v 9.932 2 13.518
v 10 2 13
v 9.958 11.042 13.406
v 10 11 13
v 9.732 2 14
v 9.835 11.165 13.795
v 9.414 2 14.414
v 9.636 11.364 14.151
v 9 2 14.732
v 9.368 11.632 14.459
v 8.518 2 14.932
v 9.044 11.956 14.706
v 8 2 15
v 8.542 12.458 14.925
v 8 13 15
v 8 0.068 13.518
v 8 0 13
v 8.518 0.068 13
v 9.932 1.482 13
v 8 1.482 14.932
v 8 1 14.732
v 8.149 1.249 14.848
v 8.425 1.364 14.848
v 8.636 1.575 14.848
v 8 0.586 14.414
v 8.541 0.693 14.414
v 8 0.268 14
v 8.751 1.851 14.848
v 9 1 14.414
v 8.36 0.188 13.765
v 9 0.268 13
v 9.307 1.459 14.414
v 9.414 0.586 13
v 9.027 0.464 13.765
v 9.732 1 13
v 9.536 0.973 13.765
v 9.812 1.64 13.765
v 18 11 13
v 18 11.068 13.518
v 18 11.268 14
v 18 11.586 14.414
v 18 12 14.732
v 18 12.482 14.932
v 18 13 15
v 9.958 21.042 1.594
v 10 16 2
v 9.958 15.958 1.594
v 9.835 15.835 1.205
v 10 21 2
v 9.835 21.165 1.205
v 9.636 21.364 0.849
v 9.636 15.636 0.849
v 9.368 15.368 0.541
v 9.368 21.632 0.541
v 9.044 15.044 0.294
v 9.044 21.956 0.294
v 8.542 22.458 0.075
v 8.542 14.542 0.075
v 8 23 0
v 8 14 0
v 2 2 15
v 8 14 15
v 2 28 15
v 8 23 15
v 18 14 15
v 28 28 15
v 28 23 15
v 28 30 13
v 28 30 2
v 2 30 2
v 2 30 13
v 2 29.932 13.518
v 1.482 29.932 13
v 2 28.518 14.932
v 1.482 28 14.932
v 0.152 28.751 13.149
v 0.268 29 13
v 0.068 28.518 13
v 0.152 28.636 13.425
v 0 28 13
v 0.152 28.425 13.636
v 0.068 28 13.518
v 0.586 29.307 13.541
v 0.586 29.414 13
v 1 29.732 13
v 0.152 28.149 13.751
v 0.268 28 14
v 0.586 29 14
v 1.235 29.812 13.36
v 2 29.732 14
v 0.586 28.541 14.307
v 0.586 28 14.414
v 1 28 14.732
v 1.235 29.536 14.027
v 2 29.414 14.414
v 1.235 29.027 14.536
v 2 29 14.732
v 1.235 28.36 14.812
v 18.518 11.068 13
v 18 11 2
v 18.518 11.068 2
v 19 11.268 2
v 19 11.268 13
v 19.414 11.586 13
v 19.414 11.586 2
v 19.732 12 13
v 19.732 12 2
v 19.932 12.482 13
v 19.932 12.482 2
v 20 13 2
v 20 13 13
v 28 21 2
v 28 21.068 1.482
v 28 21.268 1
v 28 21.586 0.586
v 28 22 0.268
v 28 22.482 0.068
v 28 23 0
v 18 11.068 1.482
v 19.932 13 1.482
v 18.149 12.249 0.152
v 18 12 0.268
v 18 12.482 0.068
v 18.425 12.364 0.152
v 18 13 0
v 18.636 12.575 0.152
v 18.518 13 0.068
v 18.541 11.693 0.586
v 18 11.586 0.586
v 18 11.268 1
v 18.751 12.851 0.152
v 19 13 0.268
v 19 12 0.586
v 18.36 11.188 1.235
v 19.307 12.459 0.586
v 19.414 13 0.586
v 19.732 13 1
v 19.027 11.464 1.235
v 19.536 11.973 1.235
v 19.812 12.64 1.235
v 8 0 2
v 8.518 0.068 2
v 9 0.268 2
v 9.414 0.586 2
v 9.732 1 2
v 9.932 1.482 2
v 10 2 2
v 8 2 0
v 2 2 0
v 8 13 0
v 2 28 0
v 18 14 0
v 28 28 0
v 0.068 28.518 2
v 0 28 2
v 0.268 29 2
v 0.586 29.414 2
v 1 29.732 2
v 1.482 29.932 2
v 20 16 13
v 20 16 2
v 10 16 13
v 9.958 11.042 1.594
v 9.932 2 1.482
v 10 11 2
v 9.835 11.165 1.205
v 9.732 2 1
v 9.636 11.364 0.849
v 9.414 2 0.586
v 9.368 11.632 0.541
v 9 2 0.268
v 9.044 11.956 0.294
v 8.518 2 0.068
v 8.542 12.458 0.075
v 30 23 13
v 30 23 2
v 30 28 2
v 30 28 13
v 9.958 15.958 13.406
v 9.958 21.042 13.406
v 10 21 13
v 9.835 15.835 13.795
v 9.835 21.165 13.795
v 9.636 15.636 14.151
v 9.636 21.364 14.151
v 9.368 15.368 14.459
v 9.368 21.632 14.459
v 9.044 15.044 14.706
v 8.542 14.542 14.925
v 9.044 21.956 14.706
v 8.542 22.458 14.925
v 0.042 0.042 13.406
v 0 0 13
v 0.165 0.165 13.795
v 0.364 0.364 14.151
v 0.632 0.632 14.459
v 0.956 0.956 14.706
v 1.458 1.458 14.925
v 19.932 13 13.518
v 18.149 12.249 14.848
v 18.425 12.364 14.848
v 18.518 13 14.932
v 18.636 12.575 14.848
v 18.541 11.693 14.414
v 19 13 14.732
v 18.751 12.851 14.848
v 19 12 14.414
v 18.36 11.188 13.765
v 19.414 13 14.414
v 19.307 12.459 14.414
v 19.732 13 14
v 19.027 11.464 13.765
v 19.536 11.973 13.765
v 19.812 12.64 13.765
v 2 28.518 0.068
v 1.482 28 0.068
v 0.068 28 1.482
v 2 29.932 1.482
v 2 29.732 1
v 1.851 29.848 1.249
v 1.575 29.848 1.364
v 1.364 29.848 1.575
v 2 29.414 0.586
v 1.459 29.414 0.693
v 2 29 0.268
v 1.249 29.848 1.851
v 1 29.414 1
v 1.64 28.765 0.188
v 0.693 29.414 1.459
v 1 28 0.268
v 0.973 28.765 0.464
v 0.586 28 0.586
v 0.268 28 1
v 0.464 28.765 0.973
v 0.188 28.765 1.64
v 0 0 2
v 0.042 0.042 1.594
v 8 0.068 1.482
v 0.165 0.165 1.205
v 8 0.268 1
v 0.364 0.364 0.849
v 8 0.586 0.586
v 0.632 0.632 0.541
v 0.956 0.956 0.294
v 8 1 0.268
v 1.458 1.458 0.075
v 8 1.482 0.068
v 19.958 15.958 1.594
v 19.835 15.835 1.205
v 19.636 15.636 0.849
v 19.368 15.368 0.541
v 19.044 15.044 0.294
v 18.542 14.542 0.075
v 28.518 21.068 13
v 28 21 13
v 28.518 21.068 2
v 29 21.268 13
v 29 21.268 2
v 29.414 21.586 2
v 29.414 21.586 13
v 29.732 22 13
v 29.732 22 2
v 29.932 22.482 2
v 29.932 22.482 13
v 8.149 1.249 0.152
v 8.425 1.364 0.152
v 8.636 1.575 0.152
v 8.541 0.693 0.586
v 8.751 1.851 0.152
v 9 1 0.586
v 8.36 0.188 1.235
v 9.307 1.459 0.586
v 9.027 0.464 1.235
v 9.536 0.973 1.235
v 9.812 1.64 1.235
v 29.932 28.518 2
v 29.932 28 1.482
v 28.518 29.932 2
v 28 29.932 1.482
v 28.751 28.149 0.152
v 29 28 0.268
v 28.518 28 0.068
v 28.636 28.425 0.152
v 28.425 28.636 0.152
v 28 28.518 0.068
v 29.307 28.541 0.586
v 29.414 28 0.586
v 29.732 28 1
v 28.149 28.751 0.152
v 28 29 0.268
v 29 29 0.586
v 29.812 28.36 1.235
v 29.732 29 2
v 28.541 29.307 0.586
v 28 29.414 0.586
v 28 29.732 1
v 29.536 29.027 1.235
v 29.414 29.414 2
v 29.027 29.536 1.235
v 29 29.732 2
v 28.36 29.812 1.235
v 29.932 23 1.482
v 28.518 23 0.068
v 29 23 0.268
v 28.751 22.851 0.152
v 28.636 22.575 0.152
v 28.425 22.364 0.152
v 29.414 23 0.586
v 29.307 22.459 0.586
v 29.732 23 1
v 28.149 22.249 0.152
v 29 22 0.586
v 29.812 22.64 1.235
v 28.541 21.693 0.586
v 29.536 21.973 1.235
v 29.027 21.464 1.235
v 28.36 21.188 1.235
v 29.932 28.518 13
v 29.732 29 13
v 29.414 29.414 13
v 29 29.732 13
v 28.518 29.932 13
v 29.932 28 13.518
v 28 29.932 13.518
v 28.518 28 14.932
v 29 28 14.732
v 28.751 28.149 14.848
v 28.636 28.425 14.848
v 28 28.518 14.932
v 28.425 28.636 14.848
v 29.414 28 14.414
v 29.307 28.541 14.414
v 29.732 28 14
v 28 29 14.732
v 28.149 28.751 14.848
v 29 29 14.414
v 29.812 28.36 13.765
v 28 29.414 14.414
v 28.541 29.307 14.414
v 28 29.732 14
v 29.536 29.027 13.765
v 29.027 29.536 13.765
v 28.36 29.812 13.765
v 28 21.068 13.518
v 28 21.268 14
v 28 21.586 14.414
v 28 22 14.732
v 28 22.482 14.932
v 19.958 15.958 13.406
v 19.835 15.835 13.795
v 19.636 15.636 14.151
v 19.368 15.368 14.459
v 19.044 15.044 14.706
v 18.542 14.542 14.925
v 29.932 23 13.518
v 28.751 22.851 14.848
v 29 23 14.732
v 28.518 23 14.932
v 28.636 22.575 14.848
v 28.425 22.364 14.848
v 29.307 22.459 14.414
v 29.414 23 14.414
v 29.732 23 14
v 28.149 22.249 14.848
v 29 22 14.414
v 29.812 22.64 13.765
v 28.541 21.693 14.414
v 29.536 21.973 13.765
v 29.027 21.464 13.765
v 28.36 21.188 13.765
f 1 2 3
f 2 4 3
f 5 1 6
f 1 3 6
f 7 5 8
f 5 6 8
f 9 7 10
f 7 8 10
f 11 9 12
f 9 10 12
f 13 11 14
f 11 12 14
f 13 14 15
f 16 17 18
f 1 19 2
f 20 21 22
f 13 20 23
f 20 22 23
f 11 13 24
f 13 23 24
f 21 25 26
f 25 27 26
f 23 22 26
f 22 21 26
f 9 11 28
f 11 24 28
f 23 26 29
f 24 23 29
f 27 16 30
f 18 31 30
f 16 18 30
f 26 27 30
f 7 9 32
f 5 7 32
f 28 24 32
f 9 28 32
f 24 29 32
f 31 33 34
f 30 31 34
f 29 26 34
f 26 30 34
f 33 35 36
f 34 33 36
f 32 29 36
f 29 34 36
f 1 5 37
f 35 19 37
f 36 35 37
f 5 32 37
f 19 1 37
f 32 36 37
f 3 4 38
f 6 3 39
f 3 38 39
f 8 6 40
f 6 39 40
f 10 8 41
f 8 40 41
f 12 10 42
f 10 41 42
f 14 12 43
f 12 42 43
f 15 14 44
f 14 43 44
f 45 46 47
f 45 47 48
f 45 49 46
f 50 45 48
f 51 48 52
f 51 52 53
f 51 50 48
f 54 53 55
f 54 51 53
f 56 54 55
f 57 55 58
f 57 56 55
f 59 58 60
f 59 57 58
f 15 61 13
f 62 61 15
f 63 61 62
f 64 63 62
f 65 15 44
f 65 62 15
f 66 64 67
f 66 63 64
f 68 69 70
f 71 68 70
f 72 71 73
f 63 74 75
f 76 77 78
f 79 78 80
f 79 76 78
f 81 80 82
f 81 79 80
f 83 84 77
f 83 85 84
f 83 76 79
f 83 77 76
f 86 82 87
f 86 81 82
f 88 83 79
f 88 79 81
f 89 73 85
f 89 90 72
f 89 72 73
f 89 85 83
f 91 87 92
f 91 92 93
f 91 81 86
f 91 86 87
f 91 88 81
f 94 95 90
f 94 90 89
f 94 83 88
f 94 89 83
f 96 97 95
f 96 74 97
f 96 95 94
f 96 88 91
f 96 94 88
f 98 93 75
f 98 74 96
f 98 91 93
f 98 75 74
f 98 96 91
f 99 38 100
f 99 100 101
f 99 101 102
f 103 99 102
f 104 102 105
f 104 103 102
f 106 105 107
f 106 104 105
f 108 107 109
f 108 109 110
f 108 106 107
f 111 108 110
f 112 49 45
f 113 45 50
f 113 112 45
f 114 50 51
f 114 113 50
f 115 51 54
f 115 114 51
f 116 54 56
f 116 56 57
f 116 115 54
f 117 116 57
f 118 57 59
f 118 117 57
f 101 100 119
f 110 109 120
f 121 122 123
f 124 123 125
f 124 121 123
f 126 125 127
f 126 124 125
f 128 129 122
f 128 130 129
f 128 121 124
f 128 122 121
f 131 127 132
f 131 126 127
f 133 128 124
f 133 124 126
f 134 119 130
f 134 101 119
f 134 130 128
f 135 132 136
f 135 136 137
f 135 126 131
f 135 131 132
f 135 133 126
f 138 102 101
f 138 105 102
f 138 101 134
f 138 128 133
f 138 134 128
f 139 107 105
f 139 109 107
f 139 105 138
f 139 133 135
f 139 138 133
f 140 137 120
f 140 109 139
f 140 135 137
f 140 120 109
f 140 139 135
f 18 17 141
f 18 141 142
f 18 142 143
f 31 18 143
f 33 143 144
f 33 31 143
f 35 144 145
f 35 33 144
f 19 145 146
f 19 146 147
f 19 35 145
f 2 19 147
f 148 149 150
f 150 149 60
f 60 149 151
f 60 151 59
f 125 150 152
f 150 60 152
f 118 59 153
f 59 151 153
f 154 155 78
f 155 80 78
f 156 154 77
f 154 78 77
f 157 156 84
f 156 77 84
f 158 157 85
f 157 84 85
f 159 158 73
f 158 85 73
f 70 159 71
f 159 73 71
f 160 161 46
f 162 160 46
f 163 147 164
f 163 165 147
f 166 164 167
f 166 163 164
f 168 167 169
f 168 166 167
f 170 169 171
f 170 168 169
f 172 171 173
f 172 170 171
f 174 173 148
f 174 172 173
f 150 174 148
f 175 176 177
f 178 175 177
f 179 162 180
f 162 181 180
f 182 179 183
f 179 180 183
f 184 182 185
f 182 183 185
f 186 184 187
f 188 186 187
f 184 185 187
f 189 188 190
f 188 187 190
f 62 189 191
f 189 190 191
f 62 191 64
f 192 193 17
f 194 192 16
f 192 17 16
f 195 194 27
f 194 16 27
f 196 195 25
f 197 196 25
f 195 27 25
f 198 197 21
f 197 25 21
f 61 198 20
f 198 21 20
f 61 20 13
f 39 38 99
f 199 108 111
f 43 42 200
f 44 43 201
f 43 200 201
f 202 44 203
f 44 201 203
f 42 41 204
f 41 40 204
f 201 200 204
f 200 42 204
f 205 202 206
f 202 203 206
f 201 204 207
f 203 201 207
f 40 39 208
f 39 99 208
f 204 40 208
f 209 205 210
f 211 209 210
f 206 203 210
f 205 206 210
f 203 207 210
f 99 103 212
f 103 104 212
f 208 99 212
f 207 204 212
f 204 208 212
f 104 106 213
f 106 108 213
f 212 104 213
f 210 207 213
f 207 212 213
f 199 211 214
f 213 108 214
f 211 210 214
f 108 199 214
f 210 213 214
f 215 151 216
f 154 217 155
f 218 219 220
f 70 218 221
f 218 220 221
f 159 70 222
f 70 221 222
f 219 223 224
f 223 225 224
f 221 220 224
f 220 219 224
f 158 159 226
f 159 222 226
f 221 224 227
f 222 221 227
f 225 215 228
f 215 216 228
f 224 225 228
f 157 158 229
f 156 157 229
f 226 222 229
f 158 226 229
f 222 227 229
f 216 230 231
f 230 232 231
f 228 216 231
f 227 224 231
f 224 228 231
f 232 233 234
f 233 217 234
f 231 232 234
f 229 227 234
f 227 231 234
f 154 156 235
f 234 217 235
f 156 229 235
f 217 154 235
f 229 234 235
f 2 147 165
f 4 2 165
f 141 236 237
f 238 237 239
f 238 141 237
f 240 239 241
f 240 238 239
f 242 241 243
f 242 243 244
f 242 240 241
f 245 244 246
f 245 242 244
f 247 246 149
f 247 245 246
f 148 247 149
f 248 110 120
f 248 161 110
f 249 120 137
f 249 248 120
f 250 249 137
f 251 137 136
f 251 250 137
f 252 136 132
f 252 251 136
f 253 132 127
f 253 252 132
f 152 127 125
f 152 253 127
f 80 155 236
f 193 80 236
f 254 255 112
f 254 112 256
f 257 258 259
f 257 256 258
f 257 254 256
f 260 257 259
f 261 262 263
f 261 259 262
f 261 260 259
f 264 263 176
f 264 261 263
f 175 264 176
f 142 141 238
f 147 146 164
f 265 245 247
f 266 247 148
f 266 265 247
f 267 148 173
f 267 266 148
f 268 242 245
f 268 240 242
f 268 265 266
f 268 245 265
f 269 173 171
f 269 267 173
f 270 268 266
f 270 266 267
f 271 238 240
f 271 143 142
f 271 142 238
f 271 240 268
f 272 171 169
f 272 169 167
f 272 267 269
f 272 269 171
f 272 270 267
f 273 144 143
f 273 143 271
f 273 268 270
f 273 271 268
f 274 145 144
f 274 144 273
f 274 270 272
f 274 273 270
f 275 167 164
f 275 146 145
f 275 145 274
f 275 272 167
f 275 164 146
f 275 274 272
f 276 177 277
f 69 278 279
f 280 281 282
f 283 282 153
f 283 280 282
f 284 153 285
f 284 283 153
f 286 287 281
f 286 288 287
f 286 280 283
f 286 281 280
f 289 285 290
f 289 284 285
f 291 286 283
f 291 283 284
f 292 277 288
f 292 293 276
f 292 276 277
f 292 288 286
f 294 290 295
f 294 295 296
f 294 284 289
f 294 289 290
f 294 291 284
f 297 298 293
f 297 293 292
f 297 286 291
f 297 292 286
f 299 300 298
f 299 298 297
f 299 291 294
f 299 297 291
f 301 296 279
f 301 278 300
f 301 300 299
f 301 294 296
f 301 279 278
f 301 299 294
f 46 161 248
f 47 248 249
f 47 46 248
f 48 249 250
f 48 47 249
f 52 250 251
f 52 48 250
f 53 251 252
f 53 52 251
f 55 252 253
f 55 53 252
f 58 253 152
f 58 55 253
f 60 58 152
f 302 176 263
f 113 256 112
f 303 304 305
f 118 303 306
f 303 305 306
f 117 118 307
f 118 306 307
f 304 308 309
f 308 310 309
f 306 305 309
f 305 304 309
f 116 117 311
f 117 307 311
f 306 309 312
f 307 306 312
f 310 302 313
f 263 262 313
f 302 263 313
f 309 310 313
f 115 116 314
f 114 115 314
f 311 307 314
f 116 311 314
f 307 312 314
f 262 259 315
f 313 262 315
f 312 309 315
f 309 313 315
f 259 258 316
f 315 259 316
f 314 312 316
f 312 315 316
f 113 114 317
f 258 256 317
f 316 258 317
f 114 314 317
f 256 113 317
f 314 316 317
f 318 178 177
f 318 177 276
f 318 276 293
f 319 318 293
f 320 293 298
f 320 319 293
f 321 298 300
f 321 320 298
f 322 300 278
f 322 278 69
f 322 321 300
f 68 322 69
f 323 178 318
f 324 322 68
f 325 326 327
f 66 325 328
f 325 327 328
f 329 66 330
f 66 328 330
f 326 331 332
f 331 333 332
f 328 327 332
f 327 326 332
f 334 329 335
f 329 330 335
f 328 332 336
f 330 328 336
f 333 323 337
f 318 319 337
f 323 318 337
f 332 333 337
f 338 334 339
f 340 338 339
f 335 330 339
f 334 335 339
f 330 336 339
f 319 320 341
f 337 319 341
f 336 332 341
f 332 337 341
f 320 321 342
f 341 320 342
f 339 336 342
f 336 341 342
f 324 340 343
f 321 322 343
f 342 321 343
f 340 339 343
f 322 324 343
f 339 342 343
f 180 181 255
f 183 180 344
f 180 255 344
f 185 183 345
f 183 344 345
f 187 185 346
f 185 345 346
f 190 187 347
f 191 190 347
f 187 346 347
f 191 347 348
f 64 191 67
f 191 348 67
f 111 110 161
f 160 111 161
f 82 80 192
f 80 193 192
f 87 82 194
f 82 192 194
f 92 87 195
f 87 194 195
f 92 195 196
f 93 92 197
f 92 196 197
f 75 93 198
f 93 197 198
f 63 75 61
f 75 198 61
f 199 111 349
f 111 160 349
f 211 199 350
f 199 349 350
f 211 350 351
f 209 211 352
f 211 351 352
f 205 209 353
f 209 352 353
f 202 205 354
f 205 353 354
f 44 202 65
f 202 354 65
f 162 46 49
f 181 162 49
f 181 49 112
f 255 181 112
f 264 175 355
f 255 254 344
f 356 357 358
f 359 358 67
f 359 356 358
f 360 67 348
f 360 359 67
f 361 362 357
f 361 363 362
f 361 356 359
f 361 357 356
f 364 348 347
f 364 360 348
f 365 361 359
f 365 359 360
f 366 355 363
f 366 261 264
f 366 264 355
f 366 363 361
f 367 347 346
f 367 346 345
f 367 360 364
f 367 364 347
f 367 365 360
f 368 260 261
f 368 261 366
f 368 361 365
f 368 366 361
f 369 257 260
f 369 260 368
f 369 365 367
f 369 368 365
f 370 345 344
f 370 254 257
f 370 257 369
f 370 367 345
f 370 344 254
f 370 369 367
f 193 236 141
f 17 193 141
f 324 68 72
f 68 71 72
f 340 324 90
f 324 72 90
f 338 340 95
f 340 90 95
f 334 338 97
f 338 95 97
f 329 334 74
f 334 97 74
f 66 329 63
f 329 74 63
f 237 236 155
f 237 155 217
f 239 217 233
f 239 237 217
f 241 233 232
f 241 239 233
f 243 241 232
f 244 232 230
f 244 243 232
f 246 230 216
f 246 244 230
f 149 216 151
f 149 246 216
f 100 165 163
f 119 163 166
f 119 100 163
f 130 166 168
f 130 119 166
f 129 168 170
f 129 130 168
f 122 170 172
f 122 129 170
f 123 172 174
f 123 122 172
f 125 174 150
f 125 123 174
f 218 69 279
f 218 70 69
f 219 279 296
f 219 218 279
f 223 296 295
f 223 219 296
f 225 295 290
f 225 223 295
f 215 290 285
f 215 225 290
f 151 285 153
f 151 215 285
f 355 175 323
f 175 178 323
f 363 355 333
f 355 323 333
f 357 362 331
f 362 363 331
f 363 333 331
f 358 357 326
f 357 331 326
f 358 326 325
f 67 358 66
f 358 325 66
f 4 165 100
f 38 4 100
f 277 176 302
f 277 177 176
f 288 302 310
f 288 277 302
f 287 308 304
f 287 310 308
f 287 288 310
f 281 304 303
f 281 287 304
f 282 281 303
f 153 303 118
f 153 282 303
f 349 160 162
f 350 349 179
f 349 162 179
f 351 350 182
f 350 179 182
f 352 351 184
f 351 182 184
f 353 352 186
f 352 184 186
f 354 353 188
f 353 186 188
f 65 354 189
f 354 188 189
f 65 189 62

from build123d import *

# Parameters (mm, degrees)
F1_DEPTH = 15
F2_R     = 2


with BuildPart() as f1:
    # F0 (on Top) → F1 (new body)
    with BuildSketch(Plane.XY):
        Polygon((0, 30), (0, 0), (10, 0), (10, 11), (20, 11), (20, 16), (10, 16), (10, 21), (30, 21), (30, 30), align=None)
    extrude(amount=F1_DEPTH)

    # F2
    f2_edges = [f1.edges().sort_by_distance(p)[0] for p in [
        (30, 21, 7.5),
        (30, 30, 7.5),
        (30, 25.5, 0),
        (30, 25.5, 15),
        (20, 11, 7.5),
        (10, 0, 7.5),
        (20, 21, 0),
        (15, 30, 15),
        (0, 15, 0),
        (5, 0, 0),
        (10, 5.5, 0),
        (15, 11, 0),
        (20, 13.5, 0),
        (15, 16, 0),
        (10, 18.5, 0),
        (15, 30, 0),
        (0, 30, 7.5),
        (0, 15, 15),
        (5, 0, 15),
        (10, 5.5, 15),
        (15, 11, 15),
        (20, 13.5, 15),
        (15, 16, 15),
        (10, 18.5, 15),
        (20, 21, 15),
    ]]
    fillet(f2_edges, radius=F2_R)


solid = f1.part
